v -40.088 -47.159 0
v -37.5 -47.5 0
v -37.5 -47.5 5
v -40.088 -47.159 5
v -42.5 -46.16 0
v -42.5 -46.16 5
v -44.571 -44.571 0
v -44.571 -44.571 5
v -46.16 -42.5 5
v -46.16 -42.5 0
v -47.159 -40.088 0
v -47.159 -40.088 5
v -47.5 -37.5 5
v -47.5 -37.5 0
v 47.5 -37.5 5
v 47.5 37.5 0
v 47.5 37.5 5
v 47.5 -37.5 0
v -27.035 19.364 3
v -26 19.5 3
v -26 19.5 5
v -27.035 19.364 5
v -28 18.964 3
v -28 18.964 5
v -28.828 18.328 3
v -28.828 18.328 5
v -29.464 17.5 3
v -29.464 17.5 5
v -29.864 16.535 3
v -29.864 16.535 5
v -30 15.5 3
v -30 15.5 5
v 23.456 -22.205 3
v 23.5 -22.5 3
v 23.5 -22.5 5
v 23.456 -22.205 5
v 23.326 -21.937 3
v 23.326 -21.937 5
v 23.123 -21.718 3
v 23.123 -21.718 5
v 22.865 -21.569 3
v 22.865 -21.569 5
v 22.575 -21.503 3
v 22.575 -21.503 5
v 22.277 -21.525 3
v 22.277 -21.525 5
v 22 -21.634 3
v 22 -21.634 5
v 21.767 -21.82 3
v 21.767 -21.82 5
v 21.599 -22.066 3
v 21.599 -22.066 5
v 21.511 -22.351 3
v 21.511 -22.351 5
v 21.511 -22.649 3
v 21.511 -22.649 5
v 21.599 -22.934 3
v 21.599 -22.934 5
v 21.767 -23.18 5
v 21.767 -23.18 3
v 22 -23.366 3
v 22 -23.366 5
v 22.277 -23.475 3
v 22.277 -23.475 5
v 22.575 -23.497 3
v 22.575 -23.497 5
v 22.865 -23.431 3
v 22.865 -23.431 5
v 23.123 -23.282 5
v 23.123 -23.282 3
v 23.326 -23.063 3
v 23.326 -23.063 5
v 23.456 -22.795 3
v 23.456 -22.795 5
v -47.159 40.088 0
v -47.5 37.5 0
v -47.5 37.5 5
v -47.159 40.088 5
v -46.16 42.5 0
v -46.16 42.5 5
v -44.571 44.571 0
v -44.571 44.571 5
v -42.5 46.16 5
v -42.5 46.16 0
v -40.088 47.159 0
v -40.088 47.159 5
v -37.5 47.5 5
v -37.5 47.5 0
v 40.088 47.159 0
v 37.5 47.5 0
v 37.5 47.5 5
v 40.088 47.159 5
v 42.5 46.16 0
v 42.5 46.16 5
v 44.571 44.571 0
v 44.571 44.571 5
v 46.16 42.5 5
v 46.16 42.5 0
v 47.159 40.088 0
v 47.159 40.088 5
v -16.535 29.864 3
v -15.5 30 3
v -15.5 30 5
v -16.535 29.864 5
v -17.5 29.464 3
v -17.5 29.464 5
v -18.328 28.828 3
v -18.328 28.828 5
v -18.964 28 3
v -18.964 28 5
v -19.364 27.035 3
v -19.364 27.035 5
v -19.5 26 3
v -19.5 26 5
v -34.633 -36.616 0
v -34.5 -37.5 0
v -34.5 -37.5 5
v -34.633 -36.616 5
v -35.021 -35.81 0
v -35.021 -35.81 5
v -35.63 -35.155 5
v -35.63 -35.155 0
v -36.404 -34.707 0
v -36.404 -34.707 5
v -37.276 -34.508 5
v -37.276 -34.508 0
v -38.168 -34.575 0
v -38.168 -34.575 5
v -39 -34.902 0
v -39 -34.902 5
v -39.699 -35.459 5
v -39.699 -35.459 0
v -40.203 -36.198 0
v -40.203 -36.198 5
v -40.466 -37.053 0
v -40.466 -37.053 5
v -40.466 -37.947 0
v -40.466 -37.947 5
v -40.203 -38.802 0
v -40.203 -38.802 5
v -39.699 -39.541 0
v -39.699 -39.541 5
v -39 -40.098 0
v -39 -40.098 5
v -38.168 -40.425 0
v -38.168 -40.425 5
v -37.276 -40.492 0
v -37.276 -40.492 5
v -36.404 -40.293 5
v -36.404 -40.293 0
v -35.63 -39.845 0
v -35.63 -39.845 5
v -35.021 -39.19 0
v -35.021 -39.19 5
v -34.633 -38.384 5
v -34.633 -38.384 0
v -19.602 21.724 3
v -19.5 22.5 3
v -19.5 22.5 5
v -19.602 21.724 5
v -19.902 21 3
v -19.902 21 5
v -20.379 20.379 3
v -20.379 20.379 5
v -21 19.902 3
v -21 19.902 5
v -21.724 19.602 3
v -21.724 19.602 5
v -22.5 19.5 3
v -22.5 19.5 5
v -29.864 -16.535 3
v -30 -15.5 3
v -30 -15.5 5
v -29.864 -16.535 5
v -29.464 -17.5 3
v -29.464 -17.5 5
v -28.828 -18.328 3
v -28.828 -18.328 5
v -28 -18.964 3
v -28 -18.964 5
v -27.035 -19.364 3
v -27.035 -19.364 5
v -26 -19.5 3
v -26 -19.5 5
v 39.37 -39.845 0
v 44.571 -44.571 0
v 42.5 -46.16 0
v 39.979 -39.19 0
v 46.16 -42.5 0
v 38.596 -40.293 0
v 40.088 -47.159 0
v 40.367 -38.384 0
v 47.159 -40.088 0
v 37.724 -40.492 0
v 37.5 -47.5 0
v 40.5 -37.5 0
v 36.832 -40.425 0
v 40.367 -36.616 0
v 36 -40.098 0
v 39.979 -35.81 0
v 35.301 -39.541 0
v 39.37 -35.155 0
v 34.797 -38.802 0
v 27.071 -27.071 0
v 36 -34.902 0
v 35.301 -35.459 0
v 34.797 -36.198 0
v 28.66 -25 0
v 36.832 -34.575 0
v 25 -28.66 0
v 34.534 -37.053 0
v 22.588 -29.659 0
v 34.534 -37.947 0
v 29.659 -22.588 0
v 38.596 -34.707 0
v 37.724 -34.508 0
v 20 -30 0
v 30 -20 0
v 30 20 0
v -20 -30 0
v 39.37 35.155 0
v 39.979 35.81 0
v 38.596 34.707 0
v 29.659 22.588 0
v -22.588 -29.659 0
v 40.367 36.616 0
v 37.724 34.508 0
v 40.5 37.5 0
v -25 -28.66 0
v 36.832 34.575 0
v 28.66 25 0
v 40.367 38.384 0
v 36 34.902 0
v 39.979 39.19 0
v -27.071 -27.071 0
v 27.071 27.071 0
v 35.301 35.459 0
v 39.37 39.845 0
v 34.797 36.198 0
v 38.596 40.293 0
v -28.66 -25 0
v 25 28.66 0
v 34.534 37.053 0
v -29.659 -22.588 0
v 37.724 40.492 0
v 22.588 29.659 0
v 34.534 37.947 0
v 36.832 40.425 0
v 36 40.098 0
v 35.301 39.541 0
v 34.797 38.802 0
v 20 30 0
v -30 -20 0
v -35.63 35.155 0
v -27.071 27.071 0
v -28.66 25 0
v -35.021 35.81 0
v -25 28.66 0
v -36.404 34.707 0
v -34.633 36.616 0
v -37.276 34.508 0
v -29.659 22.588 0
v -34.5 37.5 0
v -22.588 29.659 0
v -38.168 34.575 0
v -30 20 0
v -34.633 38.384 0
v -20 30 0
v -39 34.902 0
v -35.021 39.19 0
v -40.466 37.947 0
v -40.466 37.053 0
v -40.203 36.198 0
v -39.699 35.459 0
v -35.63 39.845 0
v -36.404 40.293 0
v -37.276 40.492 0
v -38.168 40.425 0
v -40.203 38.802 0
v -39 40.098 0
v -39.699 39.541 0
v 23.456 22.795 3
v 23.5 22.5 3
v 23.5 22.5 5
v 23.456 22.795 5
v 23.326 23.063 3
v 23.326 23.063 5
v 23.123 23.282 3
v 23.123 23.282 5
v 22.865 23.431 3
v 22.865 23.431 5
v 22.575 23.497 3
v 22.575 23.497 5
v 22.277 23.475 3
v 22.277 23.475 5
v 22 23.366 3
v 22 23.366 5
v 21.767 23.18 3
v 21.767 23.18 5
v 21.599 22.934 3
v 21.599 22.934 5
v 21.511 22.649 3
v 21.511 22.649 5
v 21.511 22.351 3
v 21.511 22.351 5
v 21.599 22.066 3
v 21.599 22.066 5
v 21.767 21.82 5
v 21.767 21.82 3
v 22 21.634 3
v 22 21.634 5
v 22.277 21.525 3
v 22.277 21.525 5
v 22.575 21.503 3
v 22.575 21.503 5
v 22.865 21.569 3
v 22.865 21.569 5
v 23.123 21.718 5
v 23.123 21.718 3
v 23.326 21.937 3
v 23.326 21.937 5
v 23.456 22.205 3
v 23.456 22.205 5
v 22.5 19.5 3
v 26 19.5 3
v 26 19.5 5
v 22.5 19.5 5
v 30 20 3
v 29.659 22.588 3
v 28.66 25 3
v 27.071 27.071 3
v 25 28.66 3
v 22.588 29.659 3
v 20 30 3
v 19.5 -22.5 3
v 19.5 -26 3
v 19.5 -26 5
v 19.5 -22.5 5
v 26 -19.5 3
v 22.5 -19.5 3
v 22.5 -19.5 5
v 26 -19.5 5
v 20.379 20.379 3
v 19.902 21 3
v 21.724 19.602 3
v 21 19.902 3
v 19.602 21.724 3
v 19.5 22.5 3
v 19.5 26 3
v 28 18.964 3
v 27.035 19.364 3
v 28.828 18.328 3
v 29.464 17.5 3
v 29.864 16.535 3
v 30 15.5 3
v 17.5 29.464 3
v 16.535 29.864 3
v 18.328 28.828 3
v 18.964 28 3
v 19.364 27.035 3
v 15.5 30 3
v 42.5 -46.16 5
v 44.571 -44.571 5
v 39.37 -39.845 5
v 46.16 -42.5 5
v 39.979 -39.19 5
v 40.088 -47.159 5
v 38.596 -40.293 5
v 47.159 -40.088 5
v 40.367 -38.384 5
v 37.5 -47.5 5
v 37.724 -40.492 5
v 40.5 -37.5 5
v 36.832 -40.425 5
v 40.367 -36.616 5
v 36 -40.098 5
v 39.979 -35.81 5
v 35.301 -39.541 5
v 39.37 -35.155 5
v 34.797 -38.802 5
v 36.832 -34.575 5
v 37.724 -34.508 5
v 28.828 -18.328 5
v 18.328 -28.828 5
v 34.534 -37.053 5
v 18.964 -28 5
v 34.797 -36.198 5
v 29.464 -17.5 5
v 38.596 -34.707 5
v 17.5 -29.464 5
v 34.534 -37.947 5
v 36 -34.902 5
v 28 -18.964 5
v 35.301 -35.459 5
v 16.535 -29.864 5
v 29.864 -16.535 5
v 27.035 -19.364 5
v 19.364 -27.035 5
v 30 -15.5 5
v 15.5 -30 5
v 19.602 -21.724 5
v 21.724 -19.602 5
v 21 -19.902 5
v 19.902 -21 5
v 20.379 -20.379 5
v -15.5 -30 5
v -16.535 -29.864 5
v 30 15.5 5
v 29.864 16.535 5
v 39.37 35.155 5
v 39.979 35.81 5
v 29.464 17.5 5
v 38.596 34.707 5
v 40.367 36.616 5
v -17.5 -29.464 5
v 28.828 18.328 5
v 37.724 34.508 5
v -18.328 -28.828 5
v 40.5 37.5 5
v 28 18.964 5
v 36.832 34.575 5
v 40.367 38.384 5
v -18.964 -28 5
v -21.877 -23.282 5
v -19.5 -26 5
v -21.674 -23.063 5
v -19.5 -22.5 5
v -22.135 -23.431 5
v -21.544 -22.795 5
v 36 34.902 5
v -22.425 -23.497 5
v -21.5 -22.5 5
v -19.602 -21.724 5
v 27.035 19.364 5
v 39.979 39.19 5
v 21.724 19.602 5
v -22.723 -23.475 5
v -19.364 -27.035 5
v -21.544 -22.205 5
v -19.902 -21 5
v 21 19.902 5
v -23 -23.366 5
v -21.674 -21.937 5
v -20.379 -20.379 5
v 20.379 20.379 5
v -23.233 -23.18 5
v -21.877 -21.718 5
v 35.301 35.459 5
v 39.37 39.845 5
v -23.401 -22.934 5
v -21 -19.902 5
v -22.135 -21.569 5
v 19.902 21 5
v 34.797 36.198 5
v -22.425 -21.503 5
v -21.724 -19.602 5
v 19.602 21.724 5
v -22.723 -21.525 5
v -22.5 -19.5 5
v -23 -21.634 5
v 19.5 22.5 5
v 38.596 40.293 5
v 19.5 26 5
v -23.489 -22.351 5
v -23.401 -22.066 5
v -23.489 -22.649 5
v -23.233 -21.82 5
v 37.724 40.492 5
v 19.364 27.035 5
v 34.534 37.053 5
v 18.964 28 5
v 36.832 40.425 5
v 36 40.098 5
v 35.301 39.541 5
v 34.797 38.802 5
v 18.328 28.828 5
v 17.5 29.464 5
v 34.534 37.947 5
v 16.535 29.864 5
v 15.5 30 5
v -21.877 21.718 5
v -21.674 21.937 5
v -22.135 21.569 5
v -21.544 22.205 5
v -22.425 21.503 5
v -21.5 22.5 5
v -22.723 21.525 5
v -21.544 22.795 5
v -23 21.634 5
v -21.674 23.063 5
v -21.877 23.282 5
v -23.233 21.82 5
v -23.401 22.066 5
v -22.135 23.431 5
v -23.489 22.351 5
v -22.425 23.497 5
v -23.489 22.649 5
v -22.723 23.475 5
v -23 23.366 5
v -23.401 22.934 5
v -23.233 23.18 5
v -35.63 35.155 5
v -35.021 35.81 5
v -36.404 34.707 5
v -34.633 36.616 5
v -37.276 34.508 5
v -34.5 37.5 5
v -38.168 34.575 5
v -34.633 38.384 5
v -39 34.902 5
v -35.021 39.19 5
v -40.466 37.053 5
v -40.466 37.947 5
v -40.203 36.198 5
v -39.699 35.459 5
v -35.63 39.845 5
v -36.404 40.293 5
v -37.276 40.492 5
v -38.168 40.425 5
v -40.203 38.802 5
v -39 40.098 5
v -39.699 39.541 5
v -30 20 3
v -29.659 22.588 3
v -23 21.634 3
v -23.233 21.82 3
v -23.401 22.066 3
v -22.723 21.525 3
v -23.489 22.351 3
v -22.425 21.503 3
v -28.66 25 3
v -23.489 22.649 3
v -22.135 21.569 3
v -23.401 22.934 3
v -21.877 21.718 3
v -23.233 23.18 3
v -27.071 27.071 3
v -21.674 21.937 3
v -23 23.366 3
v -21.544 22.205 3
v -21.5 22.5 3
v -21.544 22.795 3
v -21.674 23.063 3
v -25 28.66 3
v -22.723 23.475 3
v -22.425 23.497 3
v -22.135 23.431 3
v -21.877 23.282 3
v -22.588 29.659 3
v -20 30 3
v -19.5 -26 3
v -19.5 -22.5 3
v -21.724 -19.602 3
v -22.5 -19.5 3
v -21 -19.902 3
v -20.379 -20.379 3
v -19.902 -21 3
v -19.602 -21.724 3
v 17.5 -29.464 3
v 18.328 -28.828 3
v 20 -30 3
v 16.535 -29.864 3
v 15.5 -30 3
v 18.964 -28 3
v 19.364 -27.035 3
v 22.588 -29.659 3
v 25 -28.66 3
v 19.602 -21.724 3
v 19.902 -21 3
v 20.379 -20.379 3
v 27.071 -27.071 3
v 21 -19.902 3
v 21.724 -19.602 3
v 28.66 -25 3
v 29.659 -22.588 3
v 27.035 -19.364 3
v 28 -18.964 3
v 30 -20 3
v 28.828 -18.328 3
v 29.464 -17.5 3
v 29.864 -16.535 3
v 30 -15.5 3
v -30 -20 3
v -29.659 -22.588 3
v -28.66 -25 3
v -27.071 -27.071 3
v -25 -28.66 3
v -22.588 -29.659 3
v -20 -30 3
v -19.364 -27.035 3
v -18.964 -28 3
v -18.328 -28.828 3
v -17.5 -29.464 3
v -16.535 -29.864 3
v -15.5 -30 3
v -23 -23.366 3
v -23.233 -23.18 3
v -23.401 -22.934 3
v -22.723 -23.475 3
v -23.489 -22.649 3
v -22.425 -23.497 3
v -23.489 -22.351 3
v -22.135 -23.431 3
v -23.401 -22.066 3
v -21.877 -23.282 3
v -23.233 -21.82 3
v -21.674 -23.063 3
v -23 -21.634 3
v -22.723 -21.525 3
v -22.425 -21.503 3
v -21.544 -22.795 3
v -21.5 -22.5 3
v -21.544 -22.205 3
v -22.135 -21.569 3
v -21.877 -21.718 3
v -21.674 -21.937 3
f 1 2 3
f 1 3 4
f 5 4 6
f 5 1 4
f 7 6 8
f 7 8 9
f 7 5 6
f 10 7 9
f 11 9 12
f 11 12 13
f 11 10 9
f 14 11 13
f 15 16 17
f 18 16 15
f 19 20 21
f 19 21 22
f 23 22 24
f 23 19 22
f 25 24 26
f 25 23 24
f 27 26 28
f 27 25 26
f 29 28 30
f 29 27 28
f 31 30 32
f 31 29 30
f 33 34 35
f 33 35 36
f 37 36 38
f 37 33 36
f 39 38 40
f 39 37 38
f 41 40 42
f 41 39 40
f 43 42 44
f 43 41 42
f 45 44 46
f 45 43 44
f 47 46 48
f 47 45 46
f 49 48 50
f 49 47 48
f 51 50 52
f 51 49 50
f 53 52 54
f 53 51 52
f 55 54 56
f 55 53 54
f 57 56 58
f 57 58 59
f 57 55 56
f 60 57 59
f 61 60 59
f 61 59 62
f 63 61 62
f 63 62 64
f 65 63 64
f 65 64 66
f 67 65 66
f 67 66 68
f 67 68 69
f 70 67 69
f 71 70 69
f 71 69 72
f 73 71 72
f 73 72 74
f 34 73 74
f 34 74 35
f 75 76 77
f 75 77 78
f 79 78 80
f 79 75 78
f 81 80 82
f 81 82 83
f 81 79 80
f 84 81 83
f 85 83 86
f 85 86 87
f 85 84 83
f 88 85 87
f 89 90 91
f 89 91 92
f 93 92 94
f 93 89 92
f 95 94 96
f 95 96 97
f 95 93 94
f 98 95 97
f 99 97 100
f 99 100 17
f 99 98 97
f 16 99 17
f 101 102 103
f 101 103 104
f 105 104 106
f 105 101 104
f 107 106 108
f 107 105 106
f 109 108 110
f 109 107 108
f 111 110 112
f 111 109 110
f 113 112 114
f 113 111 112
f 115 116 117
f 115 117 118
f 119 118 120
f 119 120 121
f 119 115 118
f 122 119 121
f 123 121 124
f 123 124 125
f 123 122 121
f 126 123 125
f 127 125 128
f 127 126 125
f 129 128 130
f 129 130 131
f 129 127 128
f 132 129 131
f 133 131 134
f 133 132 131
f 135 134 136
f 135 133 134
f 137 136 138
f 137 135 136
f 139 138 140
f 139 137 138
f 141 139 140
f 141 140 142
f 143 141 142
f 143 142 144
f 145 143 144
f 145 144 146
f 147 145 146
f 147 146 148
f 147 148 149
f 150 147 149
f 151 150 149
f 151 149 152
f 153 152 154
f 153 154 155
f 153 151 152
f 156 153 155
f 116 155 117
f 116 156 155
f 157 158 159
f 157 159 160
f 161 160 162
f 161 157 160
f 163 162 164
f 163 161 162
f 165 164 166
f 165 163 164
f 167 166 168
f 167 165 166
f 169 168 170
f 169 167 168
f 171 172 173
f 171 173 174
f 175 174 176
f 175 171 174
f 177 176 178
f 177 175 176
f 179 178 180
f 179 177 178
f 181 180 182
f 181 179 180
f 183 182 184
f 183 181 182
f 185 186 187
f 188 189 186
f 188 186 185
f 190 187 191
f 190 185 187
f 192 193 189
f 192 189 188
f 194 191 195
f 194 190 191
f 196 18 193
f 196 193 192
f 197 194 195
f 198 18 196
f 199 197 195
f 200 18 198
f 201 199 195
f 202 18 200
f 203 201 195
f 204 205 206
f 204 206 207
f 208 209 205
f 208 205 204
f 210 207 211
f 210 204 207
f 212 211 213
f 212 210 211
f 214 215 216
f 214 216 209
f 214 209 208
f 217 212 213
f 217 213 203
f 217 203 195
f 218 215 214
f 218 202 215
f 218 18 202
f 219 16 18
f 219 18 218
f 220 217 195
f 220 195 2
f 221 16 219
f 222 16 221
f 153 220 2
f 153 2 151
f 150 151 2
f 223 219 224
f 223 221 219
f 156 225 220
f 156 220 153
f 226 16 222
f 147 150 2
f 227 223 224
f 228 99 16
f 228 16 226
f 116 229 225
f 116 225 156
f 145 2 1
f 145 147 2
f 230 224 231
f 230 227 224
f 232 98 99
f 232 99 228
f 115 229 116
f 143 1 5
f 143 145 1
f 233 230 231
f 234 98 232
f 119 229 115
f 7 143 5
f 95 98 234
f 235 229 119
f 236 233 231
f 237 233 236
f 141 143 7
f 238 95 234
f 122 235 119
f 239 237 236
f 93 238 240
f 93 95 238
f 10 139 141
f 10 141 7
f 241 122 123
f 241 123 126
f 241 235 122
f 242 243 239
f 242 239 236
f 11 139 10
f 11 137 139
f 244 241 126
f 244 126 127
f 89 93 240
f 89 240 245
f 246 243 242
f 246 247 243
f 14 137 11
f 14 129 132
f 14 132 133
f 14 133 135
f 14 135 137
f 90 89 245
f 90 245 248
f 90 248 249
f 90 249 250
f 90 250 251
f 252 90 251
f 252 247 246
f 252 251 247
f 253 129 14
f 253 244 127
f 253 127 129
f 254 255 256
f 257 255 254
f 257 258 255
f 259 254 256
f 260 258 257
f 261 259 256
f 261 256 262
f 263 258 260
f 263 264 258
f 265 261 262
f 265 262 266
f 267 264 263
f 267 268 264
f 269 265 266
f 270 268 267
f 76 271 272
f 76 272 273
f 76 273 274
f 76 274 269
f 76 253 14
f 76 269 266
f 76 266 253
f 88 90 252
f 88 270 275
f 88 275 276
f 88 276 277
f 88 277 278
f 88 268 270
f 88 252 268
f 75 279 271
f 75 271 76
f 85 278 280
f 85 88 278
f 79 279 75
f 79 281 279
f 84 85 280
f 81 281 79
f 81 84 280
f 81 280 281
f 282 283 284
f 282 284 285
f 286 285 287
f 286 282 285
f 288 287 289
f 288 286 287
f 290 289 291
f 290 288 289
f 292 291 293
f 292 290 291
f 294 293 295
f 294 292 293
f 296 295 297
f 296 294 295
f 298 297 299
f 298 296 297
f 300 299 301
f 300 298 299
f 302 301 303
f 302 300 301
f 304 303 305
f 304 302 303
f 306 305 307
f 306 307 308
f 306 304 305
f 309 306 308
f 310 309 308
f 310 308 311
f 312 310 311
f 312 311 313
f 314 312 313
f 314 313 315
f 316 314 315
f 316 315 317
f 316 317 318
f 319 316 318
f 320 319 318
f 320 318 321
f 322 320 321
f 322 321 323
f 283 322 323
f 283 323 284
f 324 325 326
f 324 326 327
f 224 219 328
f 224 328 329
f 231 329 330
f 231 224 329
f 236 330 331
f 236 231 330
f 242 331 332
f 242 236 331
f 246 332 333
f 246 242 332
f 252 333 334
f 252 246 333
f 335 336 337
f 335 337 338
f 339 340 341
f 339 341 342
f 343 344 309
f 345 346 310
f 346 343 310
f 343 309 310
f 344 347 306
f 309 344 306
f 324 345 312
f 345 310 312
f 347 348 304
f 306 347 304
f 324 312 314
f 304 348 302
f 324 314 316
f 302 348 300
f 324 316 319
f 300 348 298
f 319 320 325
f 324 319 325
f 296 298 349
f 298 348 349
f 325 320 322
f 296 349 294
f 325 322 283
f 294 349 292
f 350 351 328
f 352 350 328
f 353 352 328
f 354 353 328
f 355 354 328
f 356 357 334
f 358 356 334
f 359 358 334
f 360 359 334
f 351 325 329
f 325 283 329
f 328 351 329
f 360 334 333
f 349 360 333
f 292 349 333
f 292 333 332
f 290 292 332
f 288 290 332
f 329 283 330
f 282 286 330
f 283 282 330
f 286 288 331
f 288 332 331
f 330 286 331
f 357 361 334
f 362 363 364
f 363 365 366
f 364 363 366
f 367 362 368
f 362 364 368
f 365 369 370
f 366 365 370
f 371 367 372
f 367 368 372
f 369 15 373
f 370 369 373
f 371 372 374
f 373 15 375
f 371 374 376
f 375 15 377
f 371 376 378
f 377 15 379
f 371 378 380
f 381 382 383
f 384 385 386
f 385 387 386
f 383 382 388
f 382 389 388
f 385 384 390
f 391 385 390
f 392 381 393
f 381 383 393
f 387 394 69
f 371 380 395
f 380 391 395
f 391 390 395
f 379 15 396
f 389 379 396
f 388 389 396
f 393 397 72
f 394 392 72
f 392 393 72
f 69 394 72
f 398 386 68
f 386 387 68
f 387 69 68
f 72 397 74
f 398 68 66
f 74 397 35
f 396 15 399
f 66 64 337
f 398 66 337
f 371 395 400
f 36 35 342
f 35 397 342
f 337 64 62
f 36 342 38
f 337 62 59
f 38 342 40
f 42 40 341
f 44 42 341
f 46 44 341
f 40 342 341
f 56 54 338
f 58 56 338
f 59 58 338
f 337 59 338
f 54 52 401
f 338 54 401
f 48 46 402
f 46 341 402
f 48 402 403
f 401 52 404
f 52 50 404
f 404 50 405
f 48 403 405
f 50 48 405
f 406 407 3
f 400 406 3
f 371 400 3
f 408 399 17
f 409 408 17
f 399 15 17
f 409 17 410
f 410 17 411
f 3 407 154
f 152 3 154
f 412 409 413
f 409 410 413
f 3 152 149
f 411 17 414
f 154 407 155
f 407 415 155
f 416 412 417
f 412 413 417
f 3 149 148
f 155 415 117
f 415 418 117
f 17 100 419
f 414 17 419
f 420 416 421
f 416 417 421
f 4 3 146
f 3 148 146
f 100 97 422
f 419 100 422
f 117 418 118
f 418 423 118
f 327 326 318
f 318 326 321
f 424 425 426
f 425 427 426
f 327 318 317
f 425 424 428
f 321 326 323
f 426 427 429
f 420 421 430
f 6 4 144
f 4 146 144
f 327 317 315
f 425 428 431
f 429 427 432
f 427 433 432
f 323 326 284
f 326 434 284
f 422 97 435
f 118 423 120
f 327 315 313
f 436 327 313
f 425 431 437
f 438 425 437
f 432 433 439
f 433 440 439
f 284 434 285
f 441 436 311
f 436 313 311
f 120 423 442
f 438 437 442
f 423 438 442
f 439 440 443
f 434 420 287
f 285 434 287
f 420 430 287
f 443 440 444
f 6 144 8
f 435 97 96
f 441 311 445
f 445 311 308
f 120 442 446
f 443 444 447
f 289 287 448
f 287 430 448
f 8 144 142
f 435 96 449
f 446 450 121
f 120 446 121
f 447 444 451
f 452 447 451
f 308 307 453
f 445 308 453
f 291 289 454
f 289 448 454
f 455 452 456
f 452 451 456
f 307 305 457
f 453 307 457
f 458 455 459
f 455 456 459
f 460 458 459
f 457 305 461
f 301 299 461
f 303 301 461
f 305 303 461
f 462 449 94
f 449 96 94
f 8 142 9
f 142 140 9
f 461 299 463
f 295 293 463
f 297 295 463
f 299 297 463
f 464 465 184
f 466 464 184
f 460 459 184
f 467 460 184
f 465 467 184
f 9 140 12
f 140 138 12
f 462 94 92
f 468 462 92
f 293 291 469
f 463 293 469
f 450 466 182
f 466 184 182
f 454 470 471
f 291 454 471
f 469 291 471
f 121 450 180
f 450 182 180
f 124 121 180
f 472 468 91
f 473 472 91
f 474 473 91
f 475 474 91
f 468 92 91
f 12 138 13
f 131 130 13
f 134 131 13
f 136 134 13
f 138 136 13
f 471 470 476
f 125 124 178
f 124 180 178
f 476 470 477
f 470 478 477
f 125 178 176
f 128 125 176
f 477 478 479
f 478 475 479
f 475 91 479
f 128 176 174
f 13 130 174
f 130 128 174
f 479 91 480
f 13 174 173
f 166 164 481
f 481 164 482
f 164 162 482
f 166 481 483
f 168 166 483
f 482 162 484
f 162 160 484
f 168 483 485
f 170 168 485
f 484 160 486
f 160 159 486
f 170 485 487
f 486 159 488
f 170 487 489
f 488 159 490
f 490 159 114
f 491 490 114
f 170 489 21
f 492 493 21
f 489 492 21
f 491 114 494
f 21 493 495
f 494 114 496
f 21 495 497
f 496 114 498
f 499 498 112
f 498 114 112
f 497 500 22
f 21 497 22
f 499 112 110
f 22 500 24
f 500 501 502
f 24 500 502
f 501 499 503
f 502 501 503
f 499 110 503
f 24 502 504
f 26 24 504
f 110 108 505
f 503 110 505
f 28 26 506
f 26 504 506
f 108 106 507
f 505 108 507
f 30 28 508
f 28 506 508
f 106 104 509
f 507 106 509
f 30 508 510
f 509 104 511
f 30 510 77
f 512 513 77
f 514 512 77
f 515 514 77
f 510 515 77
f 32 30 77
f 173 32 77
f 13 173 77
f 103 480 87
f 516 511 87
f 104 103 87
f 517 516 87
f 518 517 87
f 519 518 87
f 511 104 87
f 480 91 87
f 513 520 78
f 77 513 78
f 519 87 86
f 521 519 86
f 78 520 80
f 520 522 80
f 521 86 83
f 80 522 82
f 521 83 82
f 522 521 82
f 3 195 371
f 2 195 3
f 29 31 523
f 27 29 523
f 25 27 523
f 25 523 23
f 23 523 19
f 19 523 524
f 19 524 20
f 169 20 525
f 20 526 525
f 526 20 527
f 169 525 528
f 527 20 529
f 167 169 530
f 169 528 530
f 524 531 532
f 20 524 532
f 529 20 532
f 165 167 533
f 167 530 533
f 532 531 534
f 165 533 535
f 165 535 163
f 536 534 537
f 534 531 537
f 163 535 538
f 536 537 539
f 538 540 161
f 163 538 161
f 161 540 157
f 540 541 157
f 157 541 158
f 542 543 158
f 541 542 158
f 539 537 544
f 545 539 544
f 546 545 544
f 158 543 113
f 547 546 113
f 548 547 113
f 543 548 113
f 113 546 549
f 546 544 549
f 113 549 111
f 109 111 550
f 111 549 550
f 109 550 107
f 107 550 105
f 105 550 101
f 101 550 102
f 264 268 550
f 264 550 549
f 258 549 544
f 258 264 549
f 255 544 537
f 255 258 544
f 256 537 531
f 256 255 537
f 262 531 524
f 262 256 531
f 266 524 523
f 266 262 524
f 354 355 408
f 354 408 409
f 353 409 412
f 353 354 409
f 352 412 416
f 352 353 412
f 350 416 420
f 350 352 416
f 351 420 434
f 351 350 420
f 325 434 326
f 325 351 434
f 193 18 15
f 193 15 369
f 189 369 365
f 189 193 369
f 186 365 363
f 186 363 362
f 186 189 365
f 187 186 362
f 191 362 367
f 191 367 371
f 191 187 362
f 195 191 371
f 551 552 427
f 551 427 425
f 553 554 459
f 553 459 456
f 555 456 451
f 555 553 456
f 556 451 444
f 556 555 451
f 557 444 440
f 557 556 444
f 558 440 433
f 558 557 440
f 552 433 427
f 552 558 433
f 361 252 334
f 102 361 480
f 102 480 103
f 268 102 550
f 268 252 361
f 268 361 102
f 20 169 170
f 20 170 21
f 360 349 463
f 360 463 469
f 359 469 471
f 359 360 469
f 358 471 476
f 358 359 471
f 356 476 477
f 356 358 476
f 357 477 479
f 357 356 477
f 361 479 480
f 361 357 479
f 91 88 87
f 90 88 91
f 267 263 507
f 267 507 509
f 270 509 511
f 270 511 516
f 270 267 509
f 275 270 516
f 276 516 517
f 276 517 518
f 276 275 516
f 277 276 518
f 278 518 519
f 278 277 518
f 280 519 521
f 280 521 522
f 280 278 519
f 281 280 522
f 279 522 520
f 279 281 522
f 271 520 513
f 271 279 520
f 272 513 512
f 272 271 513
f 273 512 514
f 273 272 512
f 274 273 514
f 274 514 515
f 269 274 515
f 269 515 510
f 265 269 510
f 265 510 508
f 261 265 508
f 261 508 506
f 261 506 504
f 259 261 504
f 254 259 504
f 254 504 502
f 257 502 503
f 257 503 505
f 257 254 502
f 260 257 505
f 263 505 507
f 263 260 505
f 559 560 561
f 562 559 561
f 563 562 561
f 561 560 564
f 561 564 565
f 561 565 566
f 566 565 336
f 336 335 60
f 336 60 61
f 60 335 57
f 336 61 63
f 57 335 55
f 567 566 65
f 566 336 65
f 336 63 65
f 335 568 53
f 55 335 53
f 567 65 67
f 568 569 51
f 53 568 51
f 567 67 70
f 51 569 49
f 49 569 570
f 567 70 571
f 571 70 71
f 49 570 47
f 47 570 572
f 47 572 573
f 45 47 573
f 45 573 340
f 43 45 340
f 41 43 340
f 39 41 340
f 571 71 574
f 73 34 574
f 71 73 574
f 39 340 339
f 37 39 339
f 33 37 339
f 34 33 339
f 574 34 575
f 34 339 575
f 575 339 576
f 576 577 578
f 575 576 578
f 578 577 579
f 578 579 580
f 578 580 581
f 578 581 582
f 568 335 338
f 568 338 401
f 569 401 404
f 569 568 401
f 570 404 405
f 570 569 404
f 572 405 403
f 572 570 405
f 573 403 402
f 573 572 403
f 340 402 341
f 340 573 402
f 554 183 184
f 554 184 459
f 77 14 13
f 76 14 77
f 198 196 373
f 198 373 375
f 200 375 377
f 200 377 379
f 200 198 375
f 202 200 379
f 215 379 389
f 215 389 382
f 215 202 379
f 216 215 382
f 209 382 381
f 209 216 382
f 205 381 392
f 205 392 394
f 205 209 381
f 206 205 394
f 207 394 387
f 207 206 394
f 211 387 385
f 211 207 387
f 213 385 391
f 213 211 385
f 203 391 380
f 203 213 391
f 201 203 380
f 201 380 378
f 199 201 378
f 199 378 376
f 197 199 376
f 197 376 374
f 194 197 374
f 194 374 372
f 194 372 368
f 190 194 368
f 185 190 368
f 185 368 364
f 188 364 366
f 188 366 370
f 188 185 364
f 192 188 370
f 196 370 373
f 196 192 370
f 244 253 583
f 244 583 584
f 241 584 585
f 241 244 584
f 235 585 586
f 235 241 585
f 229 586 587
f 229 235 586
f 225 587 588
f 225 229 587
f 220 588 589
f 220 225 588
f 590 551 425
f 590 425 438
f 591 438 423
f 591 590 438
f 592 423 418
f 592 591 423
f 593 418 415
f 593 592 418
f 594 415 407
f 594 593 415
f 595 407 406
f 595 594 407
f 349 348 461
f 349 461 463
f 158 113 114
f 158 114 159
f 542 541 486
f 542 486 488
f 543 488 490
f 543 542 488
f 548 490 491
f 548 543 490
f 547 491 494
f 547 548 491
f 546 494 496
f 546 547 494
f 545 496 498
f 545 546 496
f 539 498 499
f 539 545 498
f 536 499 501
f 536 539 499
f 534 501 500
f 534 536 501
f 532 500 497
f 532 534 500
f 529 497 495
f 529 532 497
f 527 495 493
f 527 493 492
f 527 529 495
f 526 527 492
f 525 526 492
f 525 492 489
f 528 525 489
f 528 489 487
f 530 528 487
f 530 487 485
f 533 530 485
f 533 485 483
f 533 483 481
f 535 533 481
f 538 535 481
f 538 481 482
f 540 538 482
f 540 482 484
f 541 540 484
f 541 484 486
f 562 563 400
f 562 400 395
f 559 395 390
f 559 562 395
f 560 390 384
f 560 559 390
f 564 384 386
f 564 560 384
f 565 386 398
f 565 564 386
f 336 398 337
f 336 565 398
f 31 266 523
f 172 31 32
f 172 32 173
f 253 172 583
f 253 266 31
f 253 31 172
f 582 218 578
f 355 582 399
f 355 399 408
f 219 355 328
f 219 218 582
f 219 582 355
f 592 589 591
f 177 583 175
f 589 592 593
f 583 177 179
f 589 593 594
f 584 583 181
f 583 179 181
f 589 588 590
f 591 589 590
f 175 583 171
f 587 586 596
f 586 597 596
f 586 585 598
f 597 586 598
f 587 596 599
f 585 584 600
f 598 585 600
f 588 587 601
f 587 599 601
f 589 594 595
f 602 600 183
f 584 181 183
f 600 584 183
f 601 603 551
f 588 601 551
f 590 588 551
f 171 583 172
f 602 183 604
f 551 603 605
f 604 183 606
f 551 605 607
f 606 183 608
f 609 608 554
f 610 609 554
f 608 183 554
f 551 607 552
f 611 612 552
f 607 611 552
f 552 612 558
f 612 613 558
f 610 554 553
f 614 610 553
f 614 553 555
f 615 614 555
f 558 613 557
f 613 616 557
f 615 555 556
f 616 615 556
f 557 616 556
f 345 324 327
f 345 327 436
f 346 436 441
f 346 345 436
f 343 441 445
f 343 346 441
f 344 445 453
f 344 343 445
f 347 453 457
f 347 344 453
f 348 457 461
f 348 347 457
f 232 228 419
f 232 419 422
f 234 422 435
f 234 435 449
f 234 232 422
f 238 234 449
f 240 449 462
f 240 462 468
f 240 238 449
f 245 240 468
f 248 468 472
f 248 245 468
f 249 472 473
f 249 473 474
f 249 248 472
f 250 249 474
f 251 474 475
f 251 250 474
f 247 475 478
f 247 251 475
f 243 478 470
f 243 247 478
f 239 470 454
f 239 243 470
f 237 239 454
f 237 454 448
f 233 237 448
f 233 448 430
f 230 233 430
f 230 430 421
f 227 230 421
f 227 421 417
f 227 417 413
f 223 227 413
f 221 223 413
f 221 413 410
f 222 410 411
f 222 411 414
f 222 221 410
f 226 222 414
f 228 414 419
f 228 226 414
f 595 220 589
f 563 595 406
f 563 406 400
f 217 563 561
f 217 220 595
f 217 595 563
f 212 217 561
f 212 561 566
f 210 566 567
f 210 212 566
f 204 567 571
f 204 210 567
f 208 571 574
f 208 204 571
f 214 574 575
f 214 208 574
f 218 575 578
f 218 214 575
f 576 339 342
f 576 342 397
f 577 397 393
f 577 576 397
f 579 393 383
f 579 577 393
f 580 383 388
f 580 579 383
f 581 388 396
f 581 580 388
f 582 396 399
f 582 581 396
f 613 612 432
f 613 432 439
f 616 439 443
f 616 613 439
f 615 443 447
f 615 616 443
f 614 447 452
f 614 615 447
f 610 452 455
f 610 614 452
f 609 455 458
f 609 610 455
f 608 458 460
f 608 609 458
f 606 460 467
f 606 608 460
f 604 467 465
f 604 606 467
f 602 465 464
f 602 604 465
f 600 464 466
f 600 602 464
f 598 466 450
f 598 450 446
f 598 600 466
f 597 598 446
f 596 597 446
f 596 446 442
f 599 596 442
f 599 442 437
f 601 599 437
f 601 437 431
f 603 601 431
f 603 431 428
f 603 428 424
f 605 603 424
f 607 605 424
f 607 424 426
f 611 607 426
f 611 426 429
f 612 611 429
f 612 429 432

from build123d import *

# Parameters (mm, degrees)
SKETCH_1_R          = 1
SKETCH_1_R_2        = 3
EXTRUDE_1_DEPTH     = 5
CUT_EXTRUDE_1_DEPTH = 3


with BuildPart() as part:
    # 草图1 → 凸台-拉伸1 (new body)
    with BuildSketch(Plane.XY):
        with BuildLine():
            Line((-37.5, 47.5), (37.5, 47.5))
            ThreePointArc((37.5, 47.5), (44.571067812, 44.571067812), (47.5, 37.5))
            Line((47.5, 37.5), (47.5, -37.5))
            ThreePointArc((47.5, -37.5), (44.571067812, -44.571067812), (37.5, -47.5))
            Line((37.5, -47.5), (-37.5, -47.5))
            ThreePointArc((-37.5, -47.5), (-44.571067812, -44.571067812), (-47.5, -37.5))
            Line((-47.5, -37.5), (-47.5, 37.5))
            ThreePointArc((-47.5, 37.5), (-44.571067812, 44.571067812), (-37.5, 47.5))
        make_face()
        with Locations((-22.5, 22.5)):
            Circle(SKETCH_1_R, mode=Mode.SUBTRACT)
        with Locations((22.5, 22.5)):
            Circle(SKETCH_1_R, mode=Mode.SUBTRACT)
        with Locations((22.5, -22.5)):
            Circle(SKETCH_1_R, mode=Mode.SUBTRACT)
        with Locations((-22.5, -22.5)):
            Circle(SKETCH_1_R, mode=Mode.SUBTRACT)
        with Locations((37.5, 37.5)):
            Circle(SKETCH_1_R_2, mode=Mode.SUBTRACT)
        with Locations((-37.5, 37.5)):
            Circle(SKETCH_1_R_2, mode=Mode.SUBTRACT)
        with Locations((-37.5, -37.5)):
            Circle(SKETCH_1_R_2, mode=Mode.SUBTRACT)
        with Locations((37.5, -37.5)):
            Circle(SKETCH_1_R_2, mode=Mode.SUBTRACT)
        with BuildLine():
            Line((15.5, 30), (-15.5, 30))
            ThreePointArc((-15.5, 30), (-18.328427125, 28.828427125), (-19.5, 26))
            Line((-19.5, 26), (-19.5, 22.5))
            ThreePointArc((-19.5, 22.5), (-20.378679656, 20.378679656), (-22.5, 19.5))
            Line((-22.5, 19.5), (-26, 19.5))
            ThreePointArc((-26, 19.5), (-28.828427125, 18.328427125), (-30, 15.5))
            Line((-30, 15.5), (-30, -15.5))
            ThreePointArc((-30, -15.5), (-28.828427125, -18.328427125), (-26, -19.5))
            Line((-26, -19.5), (-22.5, -19.5))
            ThreePointArc((-22.5, -19.5), (-20.378679656, -20.378679656), (-19.5, -22.5))
            Line((-19.5, -22.5), (-19.5, -26))
            ThreePointArc((-19.5, -26), (-18.328427125, -28.828427125), (-15.5, -30))
            Line((-15.5, -30), (15.5, -30))
            ThreePointArc((15.5, -30), (18.328427125, -28.828427125), (19.5, -26))
            Line((19.5, -26), (19.5, -22.5))
            ThreePointArc((19.5, -22.5), (20.378679656, -20.378679656), (22.5, -19.5))
            Line((22.5, -19.5), (26, -19.5))
            ThreePointArc((26, -19.5), (28.828427125, -18.328427125), (30, -15.5))
            Line((30, -15.5), (30, 15.5))
            ThreePointArc((30, 15.5), (28.828427125, 18.328427125), (26, 19.5))
            Line((26, 19.5), (22.5, 19.5))
            ThreePointArc((22.5, 19.5), (20.378679656, 20.378679656), (19.5, 22.5))
            Line((19.5, 22.5), (19.5, 26))
            ThreePointArc((19.5, 26), (18.328427125, 28.828427125), (15.5, 30))
        make_face(mode=Mode.SUBTRACT)
    extrude(amount=EXTRUDE_1_DEPTH)

    # 草图2 → 切除-拉伸1 (cut)
    with BuildSketch(Plane(origin=(0, 0, 0), x_dir=(-1, 0, 0), z_dir=(0, 0, -1))):
        with BuildLine():
            Line((20, -30), (-20, -30))
            ThreePointArc((-20, -30), (-27.071067812, -27.071067812), (-30, -20))
            Line((-30, -20), (-30, 20))
            ThreePointArc((-30, 20), (-27.071067812, 27.071067812), (-20, 30))
            Line((-20, 30), (20, 30))
            ThreePointArc((20, 30), (27.071067812, 27.071067812), (30, 20))
            Line((30, 20), (30, -20))
            ThreePointArc((30, -20), (27.071067812, -27.071067812), (20, -30))
        make_face()
    extrude(amount=-CUT_EXTRUDE_1_DEPTH, mode=Mode.SUBTRACT)


solid = part.part
